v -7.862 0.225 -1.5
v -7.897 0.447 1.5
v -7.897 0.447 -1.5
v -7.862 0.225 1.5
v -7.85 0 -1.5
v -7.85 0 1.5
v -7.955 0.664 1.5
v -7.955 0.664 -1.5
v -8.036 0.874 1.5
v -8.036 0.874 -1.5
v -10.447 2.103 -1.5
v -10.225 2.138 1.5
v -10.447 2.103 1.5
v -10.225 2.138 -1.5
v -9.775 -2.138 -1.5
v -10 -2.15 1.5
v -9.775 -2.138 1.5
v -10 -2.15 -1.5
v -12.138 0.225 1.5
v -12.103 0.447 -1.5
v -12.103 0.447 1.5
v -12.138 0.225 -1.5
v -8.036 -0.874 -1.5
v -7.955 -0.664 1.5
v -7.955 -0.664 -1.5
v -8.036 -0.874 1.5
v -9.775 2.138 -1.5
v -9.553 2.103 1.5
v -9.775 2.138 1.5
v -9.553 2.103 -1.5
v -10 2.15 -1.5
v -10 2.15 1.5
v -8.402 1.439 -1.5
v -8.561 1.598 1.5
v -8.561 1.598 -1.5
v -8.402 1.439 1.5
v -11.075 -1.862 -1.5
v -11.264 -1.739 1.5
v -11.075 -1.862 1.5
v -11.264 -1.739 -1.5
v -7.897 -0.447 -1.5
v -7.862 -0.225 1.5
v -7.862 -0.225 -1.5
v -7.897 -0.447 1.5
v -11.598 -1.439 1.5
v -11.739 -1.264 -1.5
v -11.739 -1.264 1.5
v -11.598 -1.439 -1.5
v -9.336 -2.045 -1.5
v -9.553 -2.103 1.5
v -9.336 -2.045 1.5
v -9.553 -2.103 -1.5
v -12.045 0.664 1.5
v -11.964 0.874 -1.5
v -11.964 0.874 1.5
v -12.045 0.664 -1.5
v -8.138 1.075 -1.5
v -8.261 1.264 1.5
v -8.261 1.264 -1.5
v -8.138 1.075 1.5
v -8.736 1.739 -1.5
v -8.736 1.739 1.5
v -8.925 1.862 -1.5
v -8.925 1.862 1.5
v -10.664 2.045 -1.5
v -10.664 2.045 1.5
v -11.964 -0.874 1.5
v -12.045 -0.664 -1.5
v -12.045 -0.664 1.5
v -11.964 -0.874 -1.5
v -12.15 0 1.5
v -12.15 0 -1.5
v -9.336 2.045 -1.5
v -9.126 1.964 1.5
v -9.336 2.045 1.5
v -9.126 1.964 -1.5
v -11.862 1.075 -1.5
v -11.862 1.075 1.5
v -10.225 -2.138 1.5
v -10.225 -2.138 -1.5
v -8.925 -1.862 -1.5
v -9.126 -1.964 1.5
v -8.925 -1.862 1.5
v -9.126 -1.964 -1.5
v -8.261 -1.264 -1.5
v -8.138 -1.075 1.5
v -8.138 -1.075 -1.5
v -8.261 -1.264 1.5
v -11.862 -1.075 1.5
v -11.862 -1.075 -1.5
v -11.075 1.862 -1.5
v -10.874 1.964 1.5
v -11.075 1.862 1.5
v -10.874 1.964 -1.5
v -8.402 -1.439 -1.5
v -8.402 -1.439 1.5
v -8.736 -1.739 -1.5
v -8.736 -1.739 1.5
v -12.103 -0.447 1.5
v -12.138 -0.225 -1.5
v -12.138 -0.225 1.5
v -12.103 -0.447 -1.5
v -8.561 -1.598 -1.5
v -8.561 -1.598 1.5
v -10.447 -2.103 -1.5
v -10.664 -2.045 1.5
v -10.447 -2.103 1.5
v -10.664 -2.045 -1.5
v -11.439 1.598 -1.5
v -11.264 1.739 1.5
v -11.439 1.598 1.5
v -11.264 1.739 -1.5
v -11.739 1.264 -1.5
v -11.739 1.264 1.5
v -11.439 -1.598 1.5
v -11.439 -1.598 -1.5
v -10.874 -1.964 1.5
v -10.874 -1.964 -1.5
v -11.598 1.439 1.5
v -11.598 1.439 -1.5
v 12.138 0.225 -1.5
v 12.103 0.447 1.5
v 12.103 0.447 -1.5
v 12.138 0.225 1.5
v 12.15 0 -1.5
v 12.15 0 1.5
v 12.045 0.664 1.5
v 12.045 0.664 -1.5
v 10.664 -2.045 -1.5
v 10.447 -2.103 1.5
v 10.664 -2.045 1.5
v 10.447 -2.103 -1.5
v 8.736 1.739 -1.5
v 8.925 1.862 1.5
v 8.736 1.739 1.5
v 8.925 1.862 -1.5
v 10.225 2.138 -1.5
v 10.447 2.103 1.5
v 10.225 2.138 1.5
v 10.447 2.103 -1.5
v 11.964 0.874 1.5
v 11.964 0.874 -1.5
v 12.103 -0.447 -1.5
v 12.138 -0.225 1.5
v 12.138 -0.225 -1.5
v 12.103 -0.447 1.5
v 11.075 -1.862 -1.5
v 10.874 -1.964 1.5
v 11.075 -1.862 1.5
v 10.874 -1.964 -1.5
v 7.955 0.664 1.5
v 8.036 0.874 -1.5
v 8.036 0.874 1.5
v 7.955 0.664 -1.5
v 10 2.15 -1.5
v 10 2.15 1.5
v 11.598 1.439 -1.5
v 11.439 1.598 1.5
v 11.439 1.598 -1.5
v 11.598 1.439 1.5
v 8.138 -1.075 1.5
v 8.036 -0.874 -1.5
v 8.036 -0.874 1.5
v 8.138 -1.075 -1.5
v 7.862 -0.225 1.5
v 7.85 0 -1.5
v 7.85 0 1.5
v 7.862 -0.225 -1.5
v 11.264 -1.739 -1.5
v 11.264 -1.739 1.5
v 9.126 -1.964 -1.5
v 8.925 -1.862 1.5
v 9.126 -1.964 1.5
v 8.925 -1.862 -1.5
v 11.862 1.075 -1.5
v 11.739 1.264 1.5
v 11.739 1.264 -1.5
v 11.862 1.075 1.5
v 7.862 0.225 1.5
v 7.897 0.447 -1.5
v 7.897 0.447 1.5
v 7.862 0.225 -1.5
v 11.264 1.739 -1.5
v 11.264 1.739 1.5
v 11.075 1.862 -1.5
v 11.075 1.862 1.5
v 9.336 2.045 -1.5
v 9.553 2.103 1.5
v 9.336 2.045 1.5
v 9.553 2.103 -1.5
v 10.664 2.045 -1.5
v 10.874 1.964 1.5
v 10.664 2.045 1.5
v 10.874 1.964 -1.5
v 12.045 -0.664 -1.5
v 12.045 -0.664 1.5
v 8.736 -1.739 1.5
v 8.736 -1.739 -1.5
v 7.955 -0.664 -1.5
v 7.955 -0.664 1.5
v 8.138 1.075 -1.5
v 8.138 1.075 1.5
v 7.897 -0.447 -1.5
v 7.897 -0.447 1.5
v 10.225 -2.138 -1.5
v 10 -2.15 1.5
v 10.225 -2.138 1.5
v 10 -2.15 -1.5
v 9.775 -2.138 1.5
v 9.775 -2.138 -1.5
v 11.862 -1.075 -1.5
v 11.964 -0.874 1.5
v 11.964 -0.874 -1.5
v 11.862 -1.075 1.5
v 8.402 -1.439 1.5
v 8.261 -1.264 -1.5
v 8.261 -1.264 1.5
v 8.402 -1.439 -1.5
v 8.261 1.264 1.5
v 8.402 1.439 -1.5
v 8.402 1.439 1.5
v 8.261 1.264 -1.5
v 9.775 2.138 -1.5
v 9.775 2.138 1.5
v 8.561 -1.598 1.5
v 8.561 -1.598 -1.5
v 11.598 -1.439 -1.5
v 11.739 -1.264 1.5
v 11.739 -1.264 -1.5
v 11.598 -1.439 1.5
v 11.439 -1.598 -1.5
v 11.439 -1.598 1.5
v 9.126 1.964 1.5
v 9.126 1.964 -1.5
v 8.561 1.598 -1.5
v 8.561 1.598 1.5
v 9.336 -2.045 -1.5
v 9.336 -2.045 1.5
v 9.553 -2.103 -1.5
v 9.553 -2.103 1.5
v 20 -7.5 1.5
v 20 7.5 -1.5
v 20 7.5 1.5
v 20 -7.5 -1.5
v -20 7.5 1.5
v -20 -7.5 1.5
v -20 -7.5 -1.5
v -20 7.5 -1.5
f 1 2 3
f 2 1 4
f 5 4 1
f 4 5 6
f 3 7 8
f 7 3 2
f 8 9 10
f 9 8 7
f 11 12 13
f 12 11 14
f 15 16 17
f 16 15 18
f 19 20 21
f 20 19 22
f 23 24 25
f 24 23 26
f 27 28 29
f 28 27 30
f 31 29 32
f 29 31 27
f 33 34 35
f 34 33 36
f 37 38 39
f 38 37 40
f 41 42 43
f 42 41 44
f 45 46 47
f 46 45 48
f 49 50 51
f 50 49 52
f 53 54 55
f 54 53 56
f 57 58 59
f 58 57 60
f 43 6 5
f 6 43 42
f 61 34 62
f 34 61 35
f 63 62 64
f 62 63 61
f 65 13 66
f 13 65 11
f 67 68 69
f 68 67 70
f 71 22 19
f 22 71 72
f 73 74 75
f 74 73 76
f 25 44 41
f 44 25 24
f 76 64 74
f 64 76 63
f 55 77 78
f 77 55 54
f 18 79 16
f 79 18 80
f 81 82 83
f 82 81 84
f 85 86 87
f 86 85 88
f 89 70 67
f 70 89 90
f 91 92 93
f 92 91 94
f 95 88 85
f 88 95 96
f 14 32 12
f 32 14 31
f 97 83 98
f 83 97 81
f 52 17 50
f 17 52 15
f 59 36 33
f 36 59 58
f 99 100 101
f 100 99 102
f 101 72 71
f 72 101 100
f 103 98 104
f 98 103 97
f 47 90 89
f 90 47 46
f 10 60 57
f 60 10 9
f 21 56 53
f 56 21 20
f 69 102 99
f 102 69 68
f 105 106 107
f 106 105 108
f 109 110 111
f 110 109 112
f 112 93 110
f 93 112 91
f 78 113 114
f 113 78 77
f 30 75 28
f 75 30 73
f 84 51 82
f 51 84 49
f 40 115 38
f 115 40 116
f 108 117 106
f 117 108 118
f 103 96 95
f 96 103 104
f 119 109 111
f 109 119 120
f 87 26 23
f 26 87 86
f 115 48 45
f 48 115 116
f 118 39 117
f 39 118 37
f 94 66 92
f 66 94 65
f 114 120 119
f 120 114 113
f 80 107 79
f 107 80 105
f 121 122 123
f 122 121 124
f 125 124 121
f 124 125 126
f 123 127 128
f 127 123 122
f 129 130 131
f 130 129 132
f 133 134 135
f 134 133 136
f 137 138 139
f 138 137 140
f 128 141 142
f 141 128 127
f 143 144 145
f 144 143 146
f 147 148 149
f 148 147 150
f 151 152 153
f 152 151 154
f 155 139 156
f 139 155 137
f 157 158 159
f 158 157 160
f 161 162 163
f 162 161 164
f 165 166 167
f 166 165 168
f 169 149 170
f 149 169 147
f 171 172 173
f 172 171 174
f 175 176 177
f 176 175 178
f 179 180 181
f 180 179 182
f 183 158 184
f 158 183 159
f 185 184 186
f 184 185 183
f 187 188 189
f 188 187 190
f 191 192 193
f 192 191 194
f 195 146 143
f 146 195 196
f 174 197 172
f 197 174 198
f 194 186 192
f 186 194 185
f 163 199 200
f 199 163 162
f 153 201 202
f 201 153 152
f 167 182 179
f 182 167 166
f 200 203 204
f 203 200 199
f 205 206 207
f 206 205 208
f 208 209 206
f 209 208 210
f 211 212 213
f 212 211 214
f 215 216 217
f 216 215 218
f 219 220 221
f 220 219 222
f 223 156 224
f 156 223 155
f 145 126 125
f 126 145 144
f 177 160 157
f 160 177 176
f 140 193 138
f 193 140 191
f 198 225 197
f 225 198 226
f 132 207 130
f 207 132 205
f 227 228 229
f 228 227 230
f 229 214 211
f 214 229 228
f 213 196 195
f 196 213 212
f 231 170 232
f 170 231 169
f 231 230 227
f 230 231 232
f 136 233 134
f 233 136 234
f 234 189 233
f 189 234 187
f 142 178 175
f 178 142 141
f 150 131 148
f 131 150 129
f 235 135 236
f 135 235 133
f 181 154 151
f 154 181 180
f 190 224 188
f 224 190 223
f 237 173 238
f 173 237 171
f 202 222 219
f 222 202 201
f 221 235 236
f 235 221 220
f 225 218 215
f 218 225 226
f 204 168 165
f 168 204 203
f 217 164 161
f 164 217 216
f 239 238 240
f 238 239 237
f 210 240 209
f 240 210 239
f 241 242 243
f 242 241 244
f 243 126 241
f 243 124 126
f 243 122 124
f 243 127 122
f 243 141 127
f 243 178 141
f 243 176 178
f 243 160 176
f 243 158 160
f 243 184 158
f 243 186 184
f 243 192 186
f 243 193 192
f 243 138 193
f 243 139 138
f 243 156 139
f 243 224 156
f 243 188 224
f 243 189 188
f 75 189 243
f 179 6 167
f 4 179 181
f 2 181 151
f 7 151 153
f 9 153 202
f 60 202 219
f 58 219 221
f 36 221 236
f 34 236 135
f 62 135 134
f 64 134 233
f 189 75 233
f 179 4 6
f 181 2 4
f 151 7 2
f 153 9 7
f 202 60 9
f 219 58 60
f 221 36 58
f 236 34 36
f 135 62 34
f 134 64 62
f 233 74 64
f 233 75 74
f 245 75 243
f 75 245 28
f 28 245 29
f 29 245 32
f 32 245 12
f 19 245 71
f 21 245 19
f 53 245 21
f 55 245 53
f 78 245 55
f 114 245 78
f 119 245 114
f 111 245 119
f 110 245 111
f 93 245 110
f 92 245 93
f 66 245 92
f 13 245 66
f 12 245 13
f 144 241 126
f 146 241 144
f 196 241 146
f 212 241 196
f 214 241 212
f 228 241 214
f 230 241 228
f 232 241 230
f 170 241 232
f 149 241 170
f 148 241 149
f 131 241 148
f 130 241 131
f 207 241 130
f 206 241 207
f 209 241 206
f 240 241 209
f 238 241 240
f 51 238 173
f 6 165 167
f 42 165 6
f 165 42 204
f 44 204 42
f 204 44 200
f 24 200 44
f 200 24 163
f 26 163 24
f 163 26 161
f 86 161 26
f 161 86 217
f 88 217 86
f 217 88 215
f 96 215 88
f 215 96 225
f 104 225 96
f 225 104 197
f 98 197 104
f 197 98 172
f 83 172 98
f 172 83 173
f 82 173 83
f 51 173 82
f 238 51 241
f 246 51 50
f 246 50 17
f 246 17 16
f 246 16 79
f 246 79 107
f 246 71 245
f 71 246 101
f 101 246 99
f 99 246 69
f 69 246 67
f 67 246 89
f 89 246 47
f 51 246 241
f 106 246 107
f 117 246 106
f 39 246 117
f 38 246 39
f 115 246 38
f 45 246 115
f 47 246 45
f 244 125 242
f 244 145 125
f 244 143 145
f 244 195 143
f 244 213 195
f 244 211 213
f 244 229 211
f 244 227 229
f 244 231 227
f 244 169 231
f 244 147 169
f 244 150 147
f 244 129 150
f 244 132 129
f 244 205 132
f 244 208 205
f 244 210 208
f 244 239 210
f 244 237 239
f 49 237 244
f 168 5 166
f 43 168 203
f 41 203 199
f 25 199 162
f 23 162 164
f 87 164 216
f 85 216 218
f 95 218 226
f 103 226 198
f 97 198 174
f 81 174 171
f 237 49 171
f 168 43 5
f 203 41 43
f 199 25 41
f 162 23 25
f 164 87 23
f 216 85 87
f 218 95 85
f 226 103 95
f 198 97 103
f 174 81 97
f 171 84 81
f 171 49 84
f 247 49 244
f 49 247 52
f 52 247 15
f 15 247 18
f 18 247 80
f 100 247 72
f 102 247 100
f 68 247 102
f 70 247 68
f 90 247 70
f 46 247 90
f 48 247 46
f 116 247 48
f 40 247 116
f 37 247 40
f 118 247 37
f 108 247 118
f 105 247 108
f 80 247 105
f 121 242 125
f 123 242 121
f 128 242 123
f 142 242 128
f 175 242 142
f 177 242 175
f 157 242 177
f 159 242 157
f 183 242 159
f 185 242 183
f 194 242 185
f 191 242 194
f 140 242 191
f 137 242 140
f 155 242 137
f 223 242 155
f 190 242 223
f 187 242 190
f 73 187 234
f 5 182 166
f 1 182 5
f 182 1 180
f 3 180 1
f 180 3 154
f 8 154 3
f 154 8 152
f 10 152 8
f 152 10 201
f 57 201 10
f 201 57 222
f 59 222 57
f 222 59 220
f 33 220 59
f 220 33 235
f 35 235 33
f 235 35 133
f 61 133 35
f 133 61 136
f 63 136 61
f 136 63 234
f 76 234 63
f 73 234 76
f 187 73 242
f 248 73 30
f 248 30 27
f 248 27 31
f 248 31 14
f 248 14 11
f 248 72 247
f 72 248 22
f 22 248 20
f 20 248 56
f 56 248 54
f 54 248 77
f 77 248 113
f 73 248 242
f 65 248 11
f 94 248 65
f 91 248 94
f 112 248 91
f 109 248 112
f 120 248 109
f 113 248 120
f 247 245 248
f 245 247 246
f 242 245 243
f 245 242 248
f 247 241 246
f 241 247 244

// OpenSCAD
// Linear rail spacer strip.
$fn = 60;
eps = 0.02;
length = 40;
width = 15;
thickness = 3;
hole_pitch = 20;
difference() {
    cube([length,width,thickness],center=true);
    for (x=[-length/2+10:hole_pitch:length/2-10]) translate([x,0,-thickness/2-eps]) cylinder(d=4.3,h=thickness+2*eps);
}
